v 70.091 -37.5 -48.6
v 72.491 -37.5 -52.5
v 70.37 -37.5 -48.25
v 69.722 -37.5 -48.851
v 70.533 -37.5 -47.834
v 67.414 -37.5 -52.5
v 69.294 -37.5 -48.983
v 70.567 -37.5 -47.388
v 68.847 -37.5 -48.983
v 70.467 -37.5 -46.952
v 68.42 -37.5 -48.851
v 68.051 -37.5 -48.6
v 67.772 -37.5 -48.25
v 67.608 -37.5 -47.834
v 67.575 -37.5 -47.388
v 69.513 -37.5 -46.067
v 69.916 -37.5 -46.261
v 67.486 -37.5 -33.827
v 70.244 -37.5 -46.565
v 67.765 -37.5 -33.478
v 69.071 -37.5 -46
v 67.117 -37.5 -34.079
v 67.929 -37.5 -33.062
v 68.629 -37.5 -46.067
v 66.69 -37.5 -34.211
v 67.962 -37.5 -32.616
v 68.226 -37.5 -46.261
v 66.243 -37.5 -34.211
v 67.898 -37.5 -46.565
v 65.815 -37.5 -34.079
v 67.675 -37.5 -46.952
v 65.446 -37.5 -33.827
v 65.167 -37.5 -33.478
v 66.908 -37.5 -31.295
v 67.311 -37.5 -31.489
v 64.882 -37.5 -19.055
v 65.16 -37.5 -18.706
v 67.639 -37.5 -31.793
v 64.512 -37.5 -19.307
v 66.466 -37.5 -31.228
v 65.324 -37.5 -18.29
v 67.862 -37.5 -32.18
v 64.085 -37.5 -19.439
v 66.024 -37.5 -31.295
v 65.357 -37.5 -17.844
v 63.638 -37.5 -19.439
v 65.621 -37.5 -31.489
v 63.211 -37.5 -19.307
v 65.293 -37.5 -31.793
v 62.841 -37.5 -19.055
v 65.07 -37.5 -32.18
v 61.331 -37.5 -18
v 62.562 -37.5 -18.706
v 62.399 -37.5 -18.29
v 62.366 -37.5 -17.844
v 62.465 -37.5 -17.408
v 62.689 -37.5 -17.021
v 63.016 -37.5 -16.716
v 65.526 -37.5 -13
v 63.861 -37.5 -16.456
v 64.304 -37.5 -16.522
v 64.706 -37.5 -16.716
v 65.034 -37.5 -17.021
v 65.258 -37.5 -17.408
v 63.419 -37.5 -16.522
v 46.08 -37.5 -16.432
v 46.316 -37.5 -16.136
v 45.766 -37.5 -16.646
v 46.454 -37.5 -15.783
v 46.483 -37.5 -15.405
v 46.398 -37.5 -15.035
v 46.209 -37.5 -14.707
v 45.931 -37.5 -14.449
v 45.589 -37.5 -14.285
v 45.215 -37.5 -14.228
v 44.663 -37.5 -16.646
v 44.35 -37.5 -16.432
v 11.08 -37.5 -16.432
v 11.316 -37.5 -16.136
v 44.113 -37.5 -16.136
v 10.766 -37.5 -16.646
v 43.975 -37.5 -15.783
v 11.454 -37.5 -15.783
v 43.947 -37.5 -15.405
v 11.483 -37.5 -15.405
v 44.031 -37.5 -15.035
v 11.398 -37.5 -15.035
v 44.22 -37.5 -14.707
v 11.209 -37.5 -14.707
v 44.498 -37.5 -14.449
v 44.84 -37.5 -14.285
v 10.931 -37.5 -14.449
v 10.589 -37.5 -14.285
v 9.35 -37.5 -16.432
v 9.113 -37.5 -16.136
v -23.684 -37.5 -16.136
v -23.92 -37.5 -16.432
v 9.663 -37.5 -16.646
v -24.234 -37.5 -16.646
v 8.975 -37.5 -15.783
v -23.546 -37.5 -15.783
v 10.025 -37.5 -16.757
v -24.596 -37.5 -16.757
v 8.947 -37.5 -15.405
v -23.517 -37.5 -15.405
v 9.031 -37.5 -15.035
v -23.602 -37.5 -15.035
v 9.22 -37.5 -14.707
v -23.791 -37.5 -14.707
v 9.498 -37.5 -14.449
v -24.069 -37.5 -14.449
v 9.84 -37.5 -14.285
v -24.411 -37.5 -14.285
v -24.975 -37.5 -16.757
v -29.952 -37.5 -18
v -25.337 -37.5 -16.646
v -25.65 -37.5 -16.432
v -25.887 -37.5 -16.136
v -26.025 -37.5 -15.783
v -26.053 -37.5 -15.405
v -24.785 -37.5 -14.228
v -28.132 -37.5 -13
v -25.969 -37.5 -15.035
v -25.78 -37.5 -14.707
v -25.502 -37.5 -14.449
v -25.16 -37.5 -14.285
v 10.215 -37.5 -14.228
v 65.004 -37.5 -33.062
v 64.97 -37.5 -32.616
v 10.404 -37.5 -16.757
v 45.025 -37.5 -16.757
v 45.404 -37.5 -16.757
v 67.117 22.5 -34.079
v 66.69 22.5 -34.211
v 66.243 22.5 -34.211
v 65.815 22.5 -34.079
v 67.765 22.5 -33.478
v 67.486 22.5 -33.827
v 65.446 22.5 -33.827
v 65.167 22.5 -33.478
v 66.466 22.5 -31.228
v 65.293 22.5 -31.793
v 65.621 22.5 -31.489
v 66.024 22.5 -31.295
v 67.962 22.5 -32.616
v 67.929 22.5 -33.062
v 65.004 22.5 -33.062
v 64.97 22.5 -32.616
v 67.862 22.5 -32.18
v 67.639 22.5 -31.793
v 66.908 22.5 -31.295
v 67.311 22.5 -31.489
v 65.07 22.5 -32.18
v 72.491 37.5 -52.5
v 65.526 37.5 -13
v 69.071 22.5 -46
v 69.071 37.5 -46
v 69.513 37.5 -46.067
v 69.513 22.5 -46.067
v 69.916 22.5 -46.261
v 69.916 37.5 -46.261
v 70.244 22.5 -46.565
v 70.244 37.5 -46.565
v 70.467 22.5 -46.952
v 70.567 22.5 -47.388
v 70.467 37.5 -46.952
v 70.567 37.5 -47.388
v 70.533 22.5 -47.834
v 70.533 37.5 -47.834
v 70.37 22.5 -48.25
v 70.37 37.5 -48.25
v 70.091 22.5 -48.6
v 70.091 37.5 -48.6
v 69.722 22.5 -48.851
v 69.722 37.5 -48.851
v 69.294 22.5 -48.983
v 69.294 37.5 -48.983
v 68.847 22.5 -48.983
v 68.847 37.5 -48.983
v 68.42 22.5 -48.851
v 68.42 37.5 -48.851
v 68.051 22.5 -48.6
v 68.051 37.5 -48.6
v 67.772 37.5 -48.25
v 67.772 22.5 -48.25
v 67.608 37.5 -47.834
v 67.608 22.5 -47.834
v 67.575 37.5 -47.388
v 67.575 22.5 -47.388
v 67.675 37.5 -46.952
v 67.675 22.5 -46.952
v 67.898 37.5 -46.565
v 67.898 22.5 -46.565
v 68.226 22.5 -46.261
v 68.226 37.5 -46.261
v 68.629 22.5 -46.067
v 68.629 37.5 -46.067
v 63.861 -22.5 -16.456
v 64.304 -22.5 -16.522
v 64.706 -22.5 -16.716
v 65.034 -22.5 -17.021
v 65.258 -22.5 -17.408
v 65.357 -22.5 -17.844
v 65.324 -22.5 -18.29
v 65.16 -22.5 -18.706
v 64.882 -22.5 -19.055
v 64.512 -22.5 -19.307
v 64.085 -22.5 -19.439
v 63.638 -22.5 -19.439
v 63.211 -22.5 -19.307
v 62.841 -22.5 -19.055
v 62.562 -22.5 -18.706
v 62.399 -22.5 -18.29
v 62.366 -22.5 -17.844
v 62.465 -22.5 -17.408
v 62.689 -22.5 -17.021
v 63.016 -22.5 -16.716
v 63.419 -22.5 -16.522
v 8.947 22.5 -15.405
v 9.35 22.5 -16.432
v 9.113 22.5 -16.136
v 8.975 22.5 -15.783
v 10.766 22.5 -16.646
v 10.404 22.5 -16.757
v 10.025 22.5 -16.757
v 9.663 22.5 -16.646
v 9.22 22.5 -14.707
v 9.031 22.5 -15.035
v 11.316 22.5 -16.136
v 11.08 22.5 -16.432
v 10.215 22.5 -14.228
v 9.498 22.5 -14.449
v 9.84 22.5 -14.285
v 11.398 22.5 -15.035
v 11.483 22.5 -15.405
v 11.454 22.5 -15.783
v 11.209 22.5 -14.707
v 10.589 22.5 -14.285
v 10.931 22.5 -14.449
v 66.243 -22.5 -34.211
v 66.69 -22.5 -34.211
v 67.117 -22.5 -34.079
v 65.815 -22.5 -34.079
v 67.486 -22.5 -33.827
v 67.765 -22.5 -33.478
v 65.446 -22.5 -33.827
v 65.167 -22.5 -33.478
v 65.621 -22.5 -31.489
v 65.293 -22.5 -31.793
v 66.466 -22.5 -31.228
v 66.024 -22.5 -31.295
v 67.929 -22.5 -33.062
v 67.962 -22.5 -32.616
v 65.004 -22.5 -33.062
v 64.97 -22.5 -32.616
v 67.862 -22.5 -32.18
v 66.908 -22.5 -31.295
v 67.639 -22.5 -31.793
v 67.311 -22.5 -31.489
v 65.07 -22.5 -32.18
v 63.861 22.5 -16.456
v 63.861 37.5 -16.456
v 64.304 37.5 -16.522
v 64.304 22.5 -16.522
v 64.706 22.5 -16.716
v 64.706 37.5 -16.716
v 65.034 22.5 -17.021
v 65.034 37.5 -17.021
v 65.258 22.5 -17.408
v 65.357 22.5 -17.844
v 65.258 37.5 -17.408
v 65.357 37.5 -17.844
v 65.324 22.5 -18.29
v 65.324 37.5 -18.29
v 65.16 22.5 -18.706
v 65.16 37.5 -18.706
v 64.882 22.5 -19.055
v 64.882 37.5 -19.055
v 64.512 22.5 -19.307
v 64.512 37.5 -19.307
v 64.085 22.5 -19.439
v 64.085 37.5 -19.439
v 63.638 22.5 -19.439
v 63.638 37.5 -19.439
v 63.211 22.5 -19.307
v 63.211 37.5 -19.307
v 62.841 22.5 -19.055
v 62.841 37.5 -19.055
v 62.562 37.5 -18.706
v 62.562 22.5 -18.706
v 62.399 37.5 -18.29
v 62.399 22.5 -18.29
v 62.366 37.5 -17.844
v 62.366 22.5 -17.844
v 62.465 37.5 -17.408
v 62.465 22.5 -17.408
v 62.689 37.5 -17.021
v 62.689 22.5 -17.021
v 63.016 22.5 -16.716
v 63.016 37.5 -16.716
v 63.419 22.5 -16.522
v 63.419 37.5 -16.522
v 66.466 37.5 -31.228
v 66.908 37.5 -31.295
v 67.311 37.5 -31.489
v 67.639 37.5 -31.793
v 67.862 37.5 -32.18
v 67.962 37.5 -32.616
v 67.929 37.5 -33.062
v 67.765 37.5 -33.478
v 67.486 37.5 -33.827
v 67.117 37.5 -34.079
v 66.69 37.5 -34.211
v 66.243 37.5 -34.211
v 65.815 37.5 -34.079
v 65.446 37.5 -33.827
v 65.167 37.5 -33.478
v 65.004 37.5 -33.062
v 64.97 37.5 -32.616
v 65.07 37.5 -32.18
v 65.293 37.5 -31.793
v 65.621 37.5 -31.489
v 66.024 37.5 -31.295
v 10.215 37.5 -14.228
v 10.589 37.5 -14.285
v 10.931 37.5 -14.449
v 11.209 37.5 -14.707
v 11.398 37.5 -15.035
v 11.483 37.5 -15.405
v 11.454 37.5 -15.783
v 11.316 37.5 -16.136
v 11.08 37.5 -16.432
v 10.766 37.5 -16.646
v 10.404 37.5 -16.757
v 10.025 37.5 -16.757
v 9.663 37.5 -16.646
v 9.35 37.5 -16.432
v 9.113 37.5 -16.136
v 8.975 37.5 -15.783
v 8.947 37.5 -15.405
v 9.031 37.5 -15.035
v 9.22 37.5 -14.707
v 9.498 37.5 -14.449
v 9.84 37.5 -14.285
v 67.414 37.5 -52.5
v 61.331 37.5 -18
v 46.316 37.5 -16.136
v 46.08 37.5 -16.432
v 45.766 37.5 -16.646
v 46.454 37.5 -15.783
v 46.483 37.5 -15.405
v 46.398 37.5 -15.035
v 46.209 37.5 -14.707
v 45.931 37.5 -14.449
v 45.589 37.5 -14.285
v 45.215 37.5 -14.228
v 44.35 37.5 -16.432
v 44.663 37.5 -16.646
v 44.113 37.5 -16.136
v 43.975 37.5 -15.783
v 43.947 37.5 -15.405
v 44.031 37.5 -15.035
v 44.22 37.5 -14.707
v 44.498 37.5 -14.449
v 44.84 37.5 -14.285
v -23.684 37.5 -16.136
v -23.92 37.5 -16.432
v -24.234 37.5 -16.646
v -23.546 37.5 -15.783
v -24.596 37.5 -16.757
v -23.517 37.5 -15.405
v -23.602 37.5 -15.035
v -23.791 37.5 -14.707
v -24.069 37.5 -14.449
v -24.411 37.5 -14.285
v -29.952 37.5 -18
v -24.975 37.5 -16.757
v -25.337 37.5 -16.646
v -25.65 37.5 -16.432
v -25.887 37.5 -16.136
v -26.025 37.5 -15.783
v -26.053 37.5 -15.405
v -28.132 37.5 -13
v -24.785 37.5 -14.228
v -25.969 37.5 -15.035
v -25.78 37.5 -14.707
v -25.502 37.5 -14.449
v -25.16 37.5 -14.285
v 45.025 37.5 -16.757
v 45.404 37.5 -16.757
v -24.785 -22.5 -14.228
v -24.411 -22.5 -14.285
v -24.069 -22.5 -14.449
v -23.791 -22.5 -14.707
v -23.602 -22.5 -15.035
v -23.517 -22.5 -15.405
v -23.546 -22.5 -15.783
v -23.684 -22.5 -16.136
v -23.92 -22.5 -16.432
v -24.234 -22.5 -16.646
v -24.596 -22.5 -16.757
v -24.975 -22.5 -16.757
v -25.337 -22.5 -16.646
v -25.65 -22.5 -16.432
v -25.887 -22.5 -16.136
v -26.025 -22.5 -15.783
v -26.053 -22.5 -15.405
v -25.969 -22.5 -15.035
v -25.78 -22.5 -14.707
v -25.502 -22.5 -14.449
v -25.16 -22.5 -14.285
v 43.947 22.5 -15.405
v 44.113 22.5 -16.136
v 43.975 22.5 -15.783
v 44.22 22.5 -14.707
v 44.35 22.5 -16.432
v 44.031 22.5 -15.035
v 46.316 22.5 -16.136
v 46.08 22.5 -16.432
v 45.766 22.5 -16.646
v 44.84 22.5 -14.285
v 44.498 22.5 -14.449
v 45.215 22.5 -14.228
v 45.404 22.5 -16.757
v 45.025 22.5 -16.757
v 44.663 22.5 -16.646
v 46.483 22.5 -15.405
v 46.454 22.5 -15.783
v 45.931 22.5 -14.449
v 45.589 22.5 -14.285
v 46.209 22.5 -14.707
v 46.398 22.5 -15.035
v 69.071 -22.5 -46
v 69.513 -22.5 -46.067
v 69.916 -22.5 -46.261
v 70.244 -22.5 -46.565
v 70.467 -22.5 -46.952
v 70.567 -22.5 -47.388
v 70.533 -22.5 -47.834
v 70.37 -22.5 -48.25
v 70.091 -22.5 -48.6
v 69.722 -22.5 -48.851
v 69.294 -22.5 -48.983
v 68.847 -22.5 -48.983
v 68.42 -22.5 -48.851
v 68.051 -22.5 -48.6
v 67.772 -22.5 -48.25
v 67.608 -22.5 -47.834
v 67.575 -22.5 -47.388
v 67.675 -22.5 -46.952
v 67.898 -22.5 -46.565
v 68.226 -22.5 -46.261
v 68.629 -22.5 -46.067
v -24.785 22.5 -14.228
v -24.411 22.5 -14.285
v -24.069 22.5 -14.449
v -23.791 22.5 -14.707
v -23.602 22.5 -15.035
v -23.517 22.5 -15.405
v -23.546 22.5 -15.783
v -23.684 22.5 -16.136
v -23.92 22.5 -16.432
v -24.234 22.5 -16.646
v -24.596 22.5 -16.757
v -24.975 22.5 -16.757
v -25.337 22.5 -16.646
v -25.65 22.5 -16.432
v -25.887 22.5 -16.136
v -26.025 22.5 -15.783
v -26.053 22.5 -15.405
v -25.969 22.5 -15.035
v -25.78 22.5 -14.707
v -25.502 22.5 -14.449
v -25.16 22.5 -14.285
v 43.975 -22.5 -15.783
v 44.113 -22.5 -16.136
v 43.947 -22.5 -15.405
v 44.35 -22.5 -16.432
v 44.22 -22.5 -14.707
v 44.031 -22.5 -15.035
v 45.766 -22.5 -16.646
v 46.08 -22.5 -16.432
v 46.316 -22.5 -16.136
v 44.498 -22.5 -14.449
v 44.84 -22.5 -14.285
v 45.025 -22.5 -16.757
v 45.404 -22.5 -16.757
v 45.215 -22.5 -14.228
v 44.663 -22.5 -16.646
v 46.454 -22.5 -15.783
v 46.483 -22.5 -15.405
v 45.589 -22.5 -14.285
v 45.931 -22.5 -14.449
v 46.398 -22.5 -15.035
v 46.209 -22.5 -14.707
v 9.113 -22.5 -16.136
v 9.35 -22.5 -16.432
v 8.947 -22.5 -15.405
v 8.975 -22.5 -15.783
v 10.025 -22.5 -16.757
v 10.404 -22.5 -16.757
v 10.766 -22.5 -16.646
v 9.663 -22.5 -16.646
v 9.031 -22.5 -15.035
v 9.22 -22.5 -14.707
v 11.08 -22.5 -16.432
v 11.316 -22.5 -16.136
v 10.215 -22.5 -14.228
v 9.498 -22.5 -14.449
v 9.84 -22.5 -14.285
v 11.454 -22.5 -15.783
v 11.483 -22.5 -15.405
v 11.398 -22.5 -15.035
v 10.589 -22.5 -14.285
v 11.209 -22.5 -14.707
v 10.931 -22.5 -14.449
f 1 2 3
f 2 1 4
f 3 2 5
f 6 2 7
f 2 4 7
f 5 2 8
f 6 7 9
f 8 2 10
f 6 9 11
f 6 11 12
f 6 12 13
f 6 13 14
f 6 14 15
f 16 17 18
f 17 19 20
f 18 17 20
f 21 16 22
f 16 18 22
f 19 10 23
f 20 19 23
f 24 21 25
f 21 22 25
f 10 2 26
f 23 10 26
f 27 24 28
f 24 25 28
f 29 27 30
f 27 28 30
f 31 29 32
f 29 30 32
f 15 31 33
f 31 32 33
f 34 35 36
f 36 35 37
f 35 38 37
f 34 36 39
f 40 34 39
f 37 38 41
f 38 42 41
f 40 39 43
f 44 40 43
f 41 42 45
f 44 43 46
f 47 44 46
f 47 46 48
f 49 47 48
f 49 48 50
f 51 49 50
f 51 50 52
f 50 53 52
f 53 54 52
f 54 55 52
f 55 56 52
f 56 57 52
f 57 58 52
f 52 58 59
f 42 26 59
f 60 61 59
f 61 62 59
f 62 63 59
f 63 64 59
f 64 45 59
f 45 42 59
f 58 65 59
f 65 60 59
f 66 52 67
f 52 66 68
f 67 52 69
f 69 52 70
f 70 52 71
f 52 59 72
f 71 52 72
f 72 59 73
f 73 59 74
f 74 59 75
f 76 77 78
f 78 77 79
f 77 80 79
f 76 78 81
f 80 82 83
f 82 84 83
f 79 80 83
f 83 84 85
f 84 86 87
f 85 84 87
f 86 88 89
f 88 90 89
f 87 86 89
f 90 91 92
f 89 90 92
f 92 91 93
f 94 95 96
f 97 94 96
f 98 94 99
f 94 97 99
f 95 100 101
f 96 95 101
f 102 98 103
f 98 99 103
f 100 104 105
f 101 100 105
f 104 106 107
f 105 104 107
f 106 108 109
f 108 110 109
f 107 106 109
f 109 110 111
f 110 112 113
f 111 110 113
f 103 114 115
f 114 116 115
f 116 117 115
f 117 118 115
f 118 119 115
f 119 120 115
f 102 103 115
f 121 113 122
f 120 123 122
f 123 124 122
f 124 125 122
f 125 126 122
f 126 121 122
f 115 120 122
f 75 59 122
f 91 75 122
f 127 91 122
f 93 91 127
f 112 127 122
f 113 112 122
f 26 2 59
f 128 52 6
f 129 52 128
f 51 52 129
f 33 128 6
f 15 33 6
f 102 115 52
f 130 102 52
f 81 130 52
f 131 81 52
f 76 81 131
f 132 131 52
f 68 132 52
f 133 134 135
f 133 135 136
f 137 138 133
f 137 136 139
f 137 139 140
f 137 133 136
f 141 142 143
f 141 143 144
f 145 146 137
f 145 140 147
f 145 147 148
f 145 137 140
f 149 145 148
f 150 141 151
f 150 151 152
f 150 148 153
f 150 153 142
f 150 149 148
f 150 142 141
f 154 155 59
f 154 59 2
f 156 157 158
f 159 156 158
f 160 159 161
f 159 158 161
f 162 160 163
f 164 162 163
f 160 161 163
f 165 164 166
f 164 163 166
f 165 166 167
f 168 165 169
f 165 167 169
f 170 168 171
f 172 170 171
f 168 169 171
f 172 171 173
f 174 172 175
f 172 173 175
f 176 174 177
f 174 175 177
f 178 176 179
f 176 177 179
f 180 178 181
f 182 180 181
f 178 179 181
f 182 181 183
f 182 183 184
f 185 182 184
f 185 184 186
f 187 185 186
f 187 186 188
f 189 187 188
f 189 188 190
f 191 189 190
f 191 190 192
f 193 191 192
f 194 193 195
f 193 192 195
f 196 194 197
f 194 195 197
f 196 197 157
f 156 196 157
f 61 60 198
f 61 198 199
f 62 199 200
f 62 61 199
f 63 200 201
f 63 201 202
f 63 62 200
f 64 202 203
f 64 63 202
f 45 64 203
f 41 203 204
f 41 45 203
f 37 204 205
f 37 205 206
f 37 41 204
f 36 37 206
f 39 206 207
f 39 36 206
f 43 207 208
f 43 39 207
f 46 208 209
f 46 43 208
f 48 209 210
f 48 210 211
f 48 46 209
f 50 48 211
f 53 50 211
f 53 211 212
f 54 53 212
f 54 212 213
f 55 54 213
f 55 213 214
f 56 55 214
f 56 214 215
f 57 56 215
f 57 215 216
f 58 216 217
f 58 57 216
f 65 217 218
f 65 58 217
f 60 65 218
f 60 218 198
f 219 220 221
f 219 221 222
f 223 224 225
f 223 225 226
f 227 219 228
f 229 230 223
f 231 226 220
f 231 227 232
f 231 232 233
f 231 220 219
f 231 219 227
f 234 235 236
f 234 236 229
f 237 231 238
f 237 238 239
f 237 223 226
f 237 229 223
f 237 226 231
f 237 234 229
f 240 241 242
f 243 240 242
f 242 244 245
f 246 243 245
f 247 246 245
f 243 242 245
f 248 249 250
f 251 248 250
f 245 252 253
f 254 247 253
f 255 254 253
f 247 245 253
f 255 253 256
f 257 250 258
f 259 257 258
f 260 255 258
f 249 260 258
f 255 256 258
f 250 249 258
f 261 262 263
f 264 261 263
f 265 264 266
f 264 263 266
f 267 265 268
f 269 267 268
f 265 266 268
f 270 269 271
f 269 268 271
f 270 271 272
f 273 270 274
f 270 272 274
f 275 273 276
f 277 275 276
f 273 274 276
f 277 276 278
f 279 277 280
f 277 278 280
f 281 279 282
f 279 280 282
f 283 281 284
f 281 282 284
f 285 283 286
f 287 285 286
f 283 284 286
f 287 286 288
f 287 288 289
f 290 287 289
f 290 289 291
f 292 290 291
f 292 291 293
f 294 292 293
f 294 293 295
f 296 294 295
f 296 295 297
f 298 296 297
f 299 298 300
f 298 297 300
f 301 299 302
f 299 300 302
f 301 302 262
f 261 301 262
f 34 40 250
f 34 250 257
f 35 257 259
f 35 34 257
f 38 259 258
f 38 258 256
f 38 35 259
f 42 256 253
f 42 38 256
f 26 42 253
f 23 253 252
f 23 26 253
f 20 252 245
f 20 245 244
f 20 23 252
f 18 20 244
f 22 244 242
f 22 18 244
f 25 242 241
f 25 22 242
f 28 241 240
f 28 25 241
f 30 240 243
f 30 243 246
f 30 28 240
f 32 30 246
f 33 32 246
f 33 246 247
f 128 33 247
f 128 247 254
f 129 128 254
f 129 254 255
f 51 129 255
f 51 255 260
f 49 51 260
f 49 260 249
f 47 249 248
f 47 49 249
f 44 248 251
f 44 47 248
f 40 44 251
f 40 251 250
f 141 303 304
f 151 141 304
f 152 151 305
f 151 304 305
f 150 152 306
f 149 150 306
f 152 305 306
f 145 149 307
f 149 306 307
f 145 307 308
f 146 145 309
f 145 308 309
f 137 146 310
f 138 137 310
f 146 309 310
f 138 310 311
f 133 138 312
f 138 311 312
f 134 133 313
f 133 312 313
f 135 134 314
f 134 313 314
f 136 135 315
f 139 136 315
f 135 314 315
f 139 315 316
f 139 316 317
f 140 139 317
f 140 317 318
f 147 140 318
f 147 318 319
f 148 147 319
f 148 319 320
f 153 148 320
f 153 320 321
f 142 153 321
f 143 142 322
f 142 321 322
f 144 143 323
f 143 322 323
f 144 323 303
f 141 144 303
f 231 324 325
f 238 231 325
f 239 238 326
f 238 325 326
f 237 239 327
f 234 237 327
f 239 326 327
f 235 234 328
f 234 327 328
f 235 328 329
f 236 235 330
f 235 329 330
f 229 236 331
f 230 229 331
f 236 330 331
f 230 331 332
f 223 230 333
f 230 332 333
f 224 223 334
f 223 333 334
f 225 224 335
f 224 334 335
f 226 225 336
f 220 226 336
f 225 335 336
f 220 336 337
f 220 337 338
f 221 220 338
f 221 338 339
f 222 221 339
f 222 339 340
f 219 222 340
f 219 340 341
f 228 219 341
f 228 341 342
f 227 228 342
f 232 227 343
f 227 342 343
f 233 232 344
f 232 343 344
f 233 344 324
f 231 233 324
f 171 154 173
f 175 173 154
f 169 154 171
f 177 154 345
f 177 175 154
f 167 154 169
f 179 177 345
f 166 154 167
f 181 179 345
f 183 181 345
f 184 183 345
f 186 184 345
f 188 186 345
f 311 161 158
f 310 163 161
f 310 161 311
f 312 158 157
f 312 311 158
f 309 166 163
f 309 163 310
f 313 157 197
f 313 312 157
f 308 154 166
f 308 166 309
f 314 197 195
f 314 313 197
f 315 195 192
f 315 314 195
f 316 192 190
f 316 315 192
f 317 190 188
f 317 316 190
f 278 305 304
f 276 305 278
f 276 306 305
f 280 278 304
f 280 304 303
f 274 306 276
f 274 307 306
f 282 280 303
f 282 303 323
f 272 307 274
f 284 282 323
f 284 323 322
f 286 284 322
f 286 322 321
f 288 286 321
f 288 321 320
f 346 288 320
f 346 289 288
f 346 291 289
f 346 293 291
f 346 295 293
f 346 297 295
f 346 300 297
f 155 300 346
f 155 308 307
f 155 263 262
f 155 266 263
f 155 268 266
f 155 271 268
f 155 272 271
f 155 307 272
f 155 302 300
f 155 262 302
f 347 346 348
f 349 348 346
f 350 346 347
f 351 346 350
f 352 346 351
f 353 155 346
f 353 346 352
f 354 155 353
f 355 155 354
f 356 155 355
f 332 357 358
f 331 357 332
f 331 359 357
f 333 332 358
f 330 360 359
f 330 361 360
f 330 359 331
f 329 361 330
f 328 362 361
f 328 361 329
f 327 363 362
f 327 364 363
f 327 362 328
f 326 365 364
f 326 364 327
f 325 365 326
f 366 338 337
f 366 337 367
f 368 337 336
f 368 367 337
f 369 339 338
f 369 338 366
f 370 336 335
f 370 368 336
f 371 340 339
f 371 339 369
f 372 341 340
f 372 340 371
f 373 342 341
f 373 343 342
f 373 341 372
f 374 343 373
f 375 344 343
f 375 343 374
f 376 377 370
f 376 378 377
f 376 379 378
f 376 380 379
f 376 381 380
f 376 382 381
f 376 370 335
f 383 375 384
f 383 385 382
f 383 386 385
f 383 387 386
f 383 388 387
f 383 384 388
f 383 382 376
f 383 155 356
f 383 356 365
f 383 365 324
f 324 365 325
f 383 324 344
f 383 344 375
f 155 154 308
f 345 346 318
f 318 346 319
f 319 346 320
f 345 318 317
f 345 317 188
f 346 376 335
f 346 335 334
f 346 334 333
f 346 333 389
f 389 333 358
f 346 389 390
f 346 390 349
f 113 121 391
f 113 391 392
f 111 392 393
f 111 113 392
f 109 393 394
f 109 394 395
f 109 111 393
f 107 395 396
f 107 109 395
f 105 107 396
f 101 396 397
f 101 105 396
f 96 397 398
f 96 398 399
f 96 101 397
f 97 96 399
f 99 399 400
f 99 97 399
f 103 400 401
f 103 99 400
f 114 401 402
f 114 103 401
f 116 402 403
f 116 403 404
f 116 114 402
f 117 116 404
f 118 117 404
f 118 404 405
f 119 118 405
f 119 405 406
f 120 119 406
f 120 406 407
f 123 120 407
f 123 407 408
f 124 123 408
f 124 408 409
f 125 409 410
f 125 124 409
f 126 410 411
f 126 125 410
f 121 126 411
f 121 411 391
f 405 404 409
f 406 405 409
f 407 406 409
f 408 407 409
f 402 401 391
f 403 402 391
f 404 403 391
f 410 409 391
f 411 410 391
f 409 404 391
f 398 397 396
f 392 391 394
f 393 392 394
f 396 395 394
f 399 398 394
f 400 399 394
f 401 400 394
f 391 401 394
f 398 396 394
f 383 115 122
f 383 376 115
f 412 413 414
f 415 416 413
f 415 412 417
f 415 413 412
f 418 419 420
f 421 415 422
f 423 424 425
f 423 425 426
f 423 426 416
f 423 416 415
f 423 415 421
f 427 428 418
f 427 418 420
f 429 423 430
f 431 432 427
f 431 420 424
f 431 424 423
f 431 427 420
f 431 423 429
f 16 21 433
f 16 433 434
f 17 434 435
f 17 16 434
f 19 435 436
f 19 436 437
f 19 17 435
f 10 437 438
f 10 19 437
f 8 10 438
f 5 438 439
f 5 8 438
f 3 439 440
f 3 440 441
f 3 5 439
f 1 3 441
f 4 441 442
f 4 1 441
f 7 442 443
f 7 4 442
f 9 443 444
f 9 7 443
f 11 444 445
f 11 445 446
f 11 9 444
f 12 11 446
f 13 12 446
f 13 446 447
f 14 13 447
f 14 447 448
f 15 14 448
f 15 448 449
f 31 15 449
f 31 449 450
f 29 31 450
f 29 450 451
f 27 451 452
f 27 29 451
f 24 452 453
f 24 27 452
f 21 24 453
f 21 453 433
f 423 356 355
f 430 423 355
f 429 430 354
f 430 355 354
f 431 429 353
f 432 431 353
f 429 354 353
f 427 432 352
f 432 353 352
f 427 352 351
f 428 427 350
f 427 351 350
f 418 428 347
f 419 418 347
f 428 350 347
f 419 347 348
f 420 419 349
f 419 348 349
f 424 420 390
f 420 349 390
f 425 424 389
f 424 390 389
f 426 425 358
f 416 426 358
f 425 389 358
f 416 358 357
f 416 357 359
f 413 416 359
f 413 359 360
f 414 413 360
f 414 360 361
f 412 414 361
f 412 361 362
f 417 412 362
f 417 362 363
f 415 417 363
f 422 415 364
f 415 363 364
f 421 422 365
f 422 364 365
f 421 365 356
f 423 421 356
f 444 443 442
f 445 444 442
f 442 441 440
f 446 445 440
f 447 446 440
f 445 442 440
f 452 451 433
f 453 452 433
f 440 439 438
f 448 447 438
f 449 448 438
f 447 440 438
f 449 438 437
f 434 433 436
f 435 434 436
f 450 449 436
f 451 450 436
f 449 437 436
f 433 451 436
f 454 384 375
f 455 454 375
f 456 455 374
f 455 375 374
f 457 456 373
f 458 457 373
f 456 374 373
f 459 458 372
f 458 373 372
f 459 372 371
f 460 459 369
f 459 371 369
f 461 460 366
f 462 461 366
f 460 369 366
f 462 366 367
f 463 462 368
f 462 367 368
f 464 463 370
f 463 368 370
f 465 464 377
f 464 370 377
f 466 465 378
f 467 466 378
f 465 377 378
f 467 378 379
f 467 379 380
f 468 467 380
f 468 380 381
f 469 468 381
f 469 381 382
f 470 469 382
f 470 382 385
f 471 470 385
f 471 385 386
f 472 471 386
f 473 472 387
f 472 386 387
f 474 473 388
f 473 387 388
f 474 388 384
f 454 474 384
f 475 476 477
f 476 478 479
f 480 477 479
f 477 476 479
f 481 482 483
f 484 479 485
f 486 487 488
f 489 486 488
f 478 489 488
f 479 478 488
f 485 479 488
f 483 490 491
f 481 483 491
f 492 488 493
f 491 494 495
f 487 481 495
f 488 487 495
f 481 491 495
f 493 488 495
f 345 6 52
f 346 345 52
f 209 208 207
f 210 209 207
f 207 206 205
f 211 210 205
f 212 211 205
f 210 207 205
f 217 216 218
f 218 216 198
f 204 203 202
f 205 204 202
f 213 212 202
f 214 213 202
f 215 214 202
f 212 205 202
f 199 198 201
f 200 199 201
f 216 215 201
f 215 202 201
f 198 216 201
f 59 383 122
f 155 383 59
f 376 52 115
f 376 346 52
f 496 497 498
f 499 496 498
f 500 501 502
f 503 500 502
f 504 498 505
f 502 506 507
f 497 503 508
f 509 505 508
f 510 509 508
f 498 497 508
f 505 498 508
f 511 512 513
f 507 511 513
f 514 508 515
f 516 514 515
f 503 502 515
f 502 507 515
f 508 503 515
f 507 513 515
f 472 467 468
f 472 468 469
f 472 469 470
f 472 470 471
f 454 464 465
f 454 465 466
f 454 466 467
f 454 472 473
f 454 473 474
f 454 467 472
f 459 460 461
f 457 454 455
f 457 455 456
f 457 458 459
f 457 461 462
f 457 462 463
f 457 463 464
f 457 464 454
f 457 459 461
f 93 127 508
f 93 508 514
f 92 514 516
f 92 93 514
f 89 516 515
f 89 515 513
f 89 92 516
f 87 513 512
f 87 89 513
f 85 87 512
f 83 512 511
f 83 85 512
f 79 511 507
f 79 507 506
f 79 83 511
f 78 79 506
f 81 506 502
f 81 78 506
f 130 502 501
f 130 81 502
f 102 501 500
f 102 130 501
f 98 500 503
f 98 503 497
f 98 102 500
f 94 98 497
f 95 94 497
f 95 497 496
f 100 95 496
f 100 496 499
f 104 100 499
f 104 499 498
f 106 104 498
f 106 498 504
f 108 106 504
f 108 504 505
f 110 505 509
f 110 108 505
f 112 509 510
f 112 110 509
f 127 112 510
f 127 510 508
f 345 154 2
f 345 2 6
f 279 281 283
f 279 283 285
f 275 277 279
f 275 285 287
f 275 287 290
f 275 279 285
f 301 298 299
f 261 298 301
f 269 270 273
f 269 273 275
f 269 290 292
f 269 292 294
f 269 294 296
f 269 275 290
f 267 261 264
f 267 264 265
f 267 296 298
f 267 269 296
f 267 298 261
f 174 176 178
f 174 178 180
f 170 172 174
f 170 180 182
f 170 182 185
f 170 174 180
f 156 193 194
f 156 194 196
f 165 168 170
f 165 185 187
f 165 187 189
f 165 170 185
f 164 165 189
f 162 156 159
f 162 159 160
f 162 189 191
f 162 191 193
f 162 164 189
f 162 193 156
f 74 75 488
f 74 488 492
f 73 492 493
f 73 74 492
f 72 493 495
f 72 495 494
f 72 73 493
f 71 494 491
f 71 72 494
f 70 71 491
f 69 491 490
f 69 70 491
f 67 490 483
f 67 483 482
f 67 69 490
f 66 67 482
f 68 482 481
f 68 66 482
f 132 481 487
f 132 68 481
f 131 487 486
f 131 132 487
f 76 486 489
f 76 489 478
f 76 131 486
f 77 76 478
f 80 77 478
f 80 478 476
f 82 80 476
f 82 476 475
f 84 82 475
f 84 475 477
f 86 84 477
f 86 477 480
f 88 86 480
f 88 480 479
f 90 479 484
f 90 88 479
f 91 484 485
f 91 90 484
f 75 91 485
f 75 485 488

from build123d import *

# Parameters (mm, degrees)
BOSS_EXTRUDE1_DEPTH = 37.5
SKETCH2_R           = 1.271589992
SKETCH2_R_2         = 1.5
CUT_EXTRUDE1_DEPTH  = 15


with BuildPart() as part:
    # Sketch1 → Boss-Extrude1 (new body)
    with BuildSketch(Plane(origin=(0, 0, 0), x_dir=(-1, 0, 0), z_dir=(0, 1, 0))):
        Polygon((28.132122167, -13), (-65.526137841, -13), (-72.491053579, -52.5), (-67.41392052, -52.5), (-61.330639685, -18), (29.951973339, -18), align=None)
    extrude(amount=BOSS_EXTRUDE1_DEPTH)

    # Sketch2 → Cut-Extrude1 (cut)
    with BuildSketch(Plane(origin=(0, 37.5, 0), x_dir=(-1, 0, 0), z_dir=(0, 1, 0))):
        with Locations(Location((-45.214663337, -15.5, 0), (0, 0, 90))):
            Circle(SKETCH2_R)
        with Locations(Location((-10.214663337, -15.5, 0), (0, 0, 90))):
            Circle(SKETCH2_R)
        with Locations(Location((24.785336663, -15.5, 0), (0, 0, 90))):
            Circle(SKETCH2_R)
        with Locations(Location((-69.070852146, -47.5, 0), (0, 0, 90))):
            Circle(SKETCH2_R_2)
        with Locations(Location((-66.466129481, -32.727883705, 0), (0, 0, 90))):
            Circle(SKETCH2_R_2)
        with Locations(Location((-63.861406816, -17.95576741, 0), (0, 0, 90))):
            Circle(SKETCH2_R_2)
    extrude(amount=-CUT_EXTRUDE1_DEPTH, mode=Mode.SUBTRACT)

    # Mirror1: part across plane


with BuildPart() as part_1:
    add(part.part)
    add(part.part.mirror(Plane(origin=(0, 0, 0), x_dir=(0, 0, 1), z_dir=(0, -1, 0))))


solid = part_1.part
